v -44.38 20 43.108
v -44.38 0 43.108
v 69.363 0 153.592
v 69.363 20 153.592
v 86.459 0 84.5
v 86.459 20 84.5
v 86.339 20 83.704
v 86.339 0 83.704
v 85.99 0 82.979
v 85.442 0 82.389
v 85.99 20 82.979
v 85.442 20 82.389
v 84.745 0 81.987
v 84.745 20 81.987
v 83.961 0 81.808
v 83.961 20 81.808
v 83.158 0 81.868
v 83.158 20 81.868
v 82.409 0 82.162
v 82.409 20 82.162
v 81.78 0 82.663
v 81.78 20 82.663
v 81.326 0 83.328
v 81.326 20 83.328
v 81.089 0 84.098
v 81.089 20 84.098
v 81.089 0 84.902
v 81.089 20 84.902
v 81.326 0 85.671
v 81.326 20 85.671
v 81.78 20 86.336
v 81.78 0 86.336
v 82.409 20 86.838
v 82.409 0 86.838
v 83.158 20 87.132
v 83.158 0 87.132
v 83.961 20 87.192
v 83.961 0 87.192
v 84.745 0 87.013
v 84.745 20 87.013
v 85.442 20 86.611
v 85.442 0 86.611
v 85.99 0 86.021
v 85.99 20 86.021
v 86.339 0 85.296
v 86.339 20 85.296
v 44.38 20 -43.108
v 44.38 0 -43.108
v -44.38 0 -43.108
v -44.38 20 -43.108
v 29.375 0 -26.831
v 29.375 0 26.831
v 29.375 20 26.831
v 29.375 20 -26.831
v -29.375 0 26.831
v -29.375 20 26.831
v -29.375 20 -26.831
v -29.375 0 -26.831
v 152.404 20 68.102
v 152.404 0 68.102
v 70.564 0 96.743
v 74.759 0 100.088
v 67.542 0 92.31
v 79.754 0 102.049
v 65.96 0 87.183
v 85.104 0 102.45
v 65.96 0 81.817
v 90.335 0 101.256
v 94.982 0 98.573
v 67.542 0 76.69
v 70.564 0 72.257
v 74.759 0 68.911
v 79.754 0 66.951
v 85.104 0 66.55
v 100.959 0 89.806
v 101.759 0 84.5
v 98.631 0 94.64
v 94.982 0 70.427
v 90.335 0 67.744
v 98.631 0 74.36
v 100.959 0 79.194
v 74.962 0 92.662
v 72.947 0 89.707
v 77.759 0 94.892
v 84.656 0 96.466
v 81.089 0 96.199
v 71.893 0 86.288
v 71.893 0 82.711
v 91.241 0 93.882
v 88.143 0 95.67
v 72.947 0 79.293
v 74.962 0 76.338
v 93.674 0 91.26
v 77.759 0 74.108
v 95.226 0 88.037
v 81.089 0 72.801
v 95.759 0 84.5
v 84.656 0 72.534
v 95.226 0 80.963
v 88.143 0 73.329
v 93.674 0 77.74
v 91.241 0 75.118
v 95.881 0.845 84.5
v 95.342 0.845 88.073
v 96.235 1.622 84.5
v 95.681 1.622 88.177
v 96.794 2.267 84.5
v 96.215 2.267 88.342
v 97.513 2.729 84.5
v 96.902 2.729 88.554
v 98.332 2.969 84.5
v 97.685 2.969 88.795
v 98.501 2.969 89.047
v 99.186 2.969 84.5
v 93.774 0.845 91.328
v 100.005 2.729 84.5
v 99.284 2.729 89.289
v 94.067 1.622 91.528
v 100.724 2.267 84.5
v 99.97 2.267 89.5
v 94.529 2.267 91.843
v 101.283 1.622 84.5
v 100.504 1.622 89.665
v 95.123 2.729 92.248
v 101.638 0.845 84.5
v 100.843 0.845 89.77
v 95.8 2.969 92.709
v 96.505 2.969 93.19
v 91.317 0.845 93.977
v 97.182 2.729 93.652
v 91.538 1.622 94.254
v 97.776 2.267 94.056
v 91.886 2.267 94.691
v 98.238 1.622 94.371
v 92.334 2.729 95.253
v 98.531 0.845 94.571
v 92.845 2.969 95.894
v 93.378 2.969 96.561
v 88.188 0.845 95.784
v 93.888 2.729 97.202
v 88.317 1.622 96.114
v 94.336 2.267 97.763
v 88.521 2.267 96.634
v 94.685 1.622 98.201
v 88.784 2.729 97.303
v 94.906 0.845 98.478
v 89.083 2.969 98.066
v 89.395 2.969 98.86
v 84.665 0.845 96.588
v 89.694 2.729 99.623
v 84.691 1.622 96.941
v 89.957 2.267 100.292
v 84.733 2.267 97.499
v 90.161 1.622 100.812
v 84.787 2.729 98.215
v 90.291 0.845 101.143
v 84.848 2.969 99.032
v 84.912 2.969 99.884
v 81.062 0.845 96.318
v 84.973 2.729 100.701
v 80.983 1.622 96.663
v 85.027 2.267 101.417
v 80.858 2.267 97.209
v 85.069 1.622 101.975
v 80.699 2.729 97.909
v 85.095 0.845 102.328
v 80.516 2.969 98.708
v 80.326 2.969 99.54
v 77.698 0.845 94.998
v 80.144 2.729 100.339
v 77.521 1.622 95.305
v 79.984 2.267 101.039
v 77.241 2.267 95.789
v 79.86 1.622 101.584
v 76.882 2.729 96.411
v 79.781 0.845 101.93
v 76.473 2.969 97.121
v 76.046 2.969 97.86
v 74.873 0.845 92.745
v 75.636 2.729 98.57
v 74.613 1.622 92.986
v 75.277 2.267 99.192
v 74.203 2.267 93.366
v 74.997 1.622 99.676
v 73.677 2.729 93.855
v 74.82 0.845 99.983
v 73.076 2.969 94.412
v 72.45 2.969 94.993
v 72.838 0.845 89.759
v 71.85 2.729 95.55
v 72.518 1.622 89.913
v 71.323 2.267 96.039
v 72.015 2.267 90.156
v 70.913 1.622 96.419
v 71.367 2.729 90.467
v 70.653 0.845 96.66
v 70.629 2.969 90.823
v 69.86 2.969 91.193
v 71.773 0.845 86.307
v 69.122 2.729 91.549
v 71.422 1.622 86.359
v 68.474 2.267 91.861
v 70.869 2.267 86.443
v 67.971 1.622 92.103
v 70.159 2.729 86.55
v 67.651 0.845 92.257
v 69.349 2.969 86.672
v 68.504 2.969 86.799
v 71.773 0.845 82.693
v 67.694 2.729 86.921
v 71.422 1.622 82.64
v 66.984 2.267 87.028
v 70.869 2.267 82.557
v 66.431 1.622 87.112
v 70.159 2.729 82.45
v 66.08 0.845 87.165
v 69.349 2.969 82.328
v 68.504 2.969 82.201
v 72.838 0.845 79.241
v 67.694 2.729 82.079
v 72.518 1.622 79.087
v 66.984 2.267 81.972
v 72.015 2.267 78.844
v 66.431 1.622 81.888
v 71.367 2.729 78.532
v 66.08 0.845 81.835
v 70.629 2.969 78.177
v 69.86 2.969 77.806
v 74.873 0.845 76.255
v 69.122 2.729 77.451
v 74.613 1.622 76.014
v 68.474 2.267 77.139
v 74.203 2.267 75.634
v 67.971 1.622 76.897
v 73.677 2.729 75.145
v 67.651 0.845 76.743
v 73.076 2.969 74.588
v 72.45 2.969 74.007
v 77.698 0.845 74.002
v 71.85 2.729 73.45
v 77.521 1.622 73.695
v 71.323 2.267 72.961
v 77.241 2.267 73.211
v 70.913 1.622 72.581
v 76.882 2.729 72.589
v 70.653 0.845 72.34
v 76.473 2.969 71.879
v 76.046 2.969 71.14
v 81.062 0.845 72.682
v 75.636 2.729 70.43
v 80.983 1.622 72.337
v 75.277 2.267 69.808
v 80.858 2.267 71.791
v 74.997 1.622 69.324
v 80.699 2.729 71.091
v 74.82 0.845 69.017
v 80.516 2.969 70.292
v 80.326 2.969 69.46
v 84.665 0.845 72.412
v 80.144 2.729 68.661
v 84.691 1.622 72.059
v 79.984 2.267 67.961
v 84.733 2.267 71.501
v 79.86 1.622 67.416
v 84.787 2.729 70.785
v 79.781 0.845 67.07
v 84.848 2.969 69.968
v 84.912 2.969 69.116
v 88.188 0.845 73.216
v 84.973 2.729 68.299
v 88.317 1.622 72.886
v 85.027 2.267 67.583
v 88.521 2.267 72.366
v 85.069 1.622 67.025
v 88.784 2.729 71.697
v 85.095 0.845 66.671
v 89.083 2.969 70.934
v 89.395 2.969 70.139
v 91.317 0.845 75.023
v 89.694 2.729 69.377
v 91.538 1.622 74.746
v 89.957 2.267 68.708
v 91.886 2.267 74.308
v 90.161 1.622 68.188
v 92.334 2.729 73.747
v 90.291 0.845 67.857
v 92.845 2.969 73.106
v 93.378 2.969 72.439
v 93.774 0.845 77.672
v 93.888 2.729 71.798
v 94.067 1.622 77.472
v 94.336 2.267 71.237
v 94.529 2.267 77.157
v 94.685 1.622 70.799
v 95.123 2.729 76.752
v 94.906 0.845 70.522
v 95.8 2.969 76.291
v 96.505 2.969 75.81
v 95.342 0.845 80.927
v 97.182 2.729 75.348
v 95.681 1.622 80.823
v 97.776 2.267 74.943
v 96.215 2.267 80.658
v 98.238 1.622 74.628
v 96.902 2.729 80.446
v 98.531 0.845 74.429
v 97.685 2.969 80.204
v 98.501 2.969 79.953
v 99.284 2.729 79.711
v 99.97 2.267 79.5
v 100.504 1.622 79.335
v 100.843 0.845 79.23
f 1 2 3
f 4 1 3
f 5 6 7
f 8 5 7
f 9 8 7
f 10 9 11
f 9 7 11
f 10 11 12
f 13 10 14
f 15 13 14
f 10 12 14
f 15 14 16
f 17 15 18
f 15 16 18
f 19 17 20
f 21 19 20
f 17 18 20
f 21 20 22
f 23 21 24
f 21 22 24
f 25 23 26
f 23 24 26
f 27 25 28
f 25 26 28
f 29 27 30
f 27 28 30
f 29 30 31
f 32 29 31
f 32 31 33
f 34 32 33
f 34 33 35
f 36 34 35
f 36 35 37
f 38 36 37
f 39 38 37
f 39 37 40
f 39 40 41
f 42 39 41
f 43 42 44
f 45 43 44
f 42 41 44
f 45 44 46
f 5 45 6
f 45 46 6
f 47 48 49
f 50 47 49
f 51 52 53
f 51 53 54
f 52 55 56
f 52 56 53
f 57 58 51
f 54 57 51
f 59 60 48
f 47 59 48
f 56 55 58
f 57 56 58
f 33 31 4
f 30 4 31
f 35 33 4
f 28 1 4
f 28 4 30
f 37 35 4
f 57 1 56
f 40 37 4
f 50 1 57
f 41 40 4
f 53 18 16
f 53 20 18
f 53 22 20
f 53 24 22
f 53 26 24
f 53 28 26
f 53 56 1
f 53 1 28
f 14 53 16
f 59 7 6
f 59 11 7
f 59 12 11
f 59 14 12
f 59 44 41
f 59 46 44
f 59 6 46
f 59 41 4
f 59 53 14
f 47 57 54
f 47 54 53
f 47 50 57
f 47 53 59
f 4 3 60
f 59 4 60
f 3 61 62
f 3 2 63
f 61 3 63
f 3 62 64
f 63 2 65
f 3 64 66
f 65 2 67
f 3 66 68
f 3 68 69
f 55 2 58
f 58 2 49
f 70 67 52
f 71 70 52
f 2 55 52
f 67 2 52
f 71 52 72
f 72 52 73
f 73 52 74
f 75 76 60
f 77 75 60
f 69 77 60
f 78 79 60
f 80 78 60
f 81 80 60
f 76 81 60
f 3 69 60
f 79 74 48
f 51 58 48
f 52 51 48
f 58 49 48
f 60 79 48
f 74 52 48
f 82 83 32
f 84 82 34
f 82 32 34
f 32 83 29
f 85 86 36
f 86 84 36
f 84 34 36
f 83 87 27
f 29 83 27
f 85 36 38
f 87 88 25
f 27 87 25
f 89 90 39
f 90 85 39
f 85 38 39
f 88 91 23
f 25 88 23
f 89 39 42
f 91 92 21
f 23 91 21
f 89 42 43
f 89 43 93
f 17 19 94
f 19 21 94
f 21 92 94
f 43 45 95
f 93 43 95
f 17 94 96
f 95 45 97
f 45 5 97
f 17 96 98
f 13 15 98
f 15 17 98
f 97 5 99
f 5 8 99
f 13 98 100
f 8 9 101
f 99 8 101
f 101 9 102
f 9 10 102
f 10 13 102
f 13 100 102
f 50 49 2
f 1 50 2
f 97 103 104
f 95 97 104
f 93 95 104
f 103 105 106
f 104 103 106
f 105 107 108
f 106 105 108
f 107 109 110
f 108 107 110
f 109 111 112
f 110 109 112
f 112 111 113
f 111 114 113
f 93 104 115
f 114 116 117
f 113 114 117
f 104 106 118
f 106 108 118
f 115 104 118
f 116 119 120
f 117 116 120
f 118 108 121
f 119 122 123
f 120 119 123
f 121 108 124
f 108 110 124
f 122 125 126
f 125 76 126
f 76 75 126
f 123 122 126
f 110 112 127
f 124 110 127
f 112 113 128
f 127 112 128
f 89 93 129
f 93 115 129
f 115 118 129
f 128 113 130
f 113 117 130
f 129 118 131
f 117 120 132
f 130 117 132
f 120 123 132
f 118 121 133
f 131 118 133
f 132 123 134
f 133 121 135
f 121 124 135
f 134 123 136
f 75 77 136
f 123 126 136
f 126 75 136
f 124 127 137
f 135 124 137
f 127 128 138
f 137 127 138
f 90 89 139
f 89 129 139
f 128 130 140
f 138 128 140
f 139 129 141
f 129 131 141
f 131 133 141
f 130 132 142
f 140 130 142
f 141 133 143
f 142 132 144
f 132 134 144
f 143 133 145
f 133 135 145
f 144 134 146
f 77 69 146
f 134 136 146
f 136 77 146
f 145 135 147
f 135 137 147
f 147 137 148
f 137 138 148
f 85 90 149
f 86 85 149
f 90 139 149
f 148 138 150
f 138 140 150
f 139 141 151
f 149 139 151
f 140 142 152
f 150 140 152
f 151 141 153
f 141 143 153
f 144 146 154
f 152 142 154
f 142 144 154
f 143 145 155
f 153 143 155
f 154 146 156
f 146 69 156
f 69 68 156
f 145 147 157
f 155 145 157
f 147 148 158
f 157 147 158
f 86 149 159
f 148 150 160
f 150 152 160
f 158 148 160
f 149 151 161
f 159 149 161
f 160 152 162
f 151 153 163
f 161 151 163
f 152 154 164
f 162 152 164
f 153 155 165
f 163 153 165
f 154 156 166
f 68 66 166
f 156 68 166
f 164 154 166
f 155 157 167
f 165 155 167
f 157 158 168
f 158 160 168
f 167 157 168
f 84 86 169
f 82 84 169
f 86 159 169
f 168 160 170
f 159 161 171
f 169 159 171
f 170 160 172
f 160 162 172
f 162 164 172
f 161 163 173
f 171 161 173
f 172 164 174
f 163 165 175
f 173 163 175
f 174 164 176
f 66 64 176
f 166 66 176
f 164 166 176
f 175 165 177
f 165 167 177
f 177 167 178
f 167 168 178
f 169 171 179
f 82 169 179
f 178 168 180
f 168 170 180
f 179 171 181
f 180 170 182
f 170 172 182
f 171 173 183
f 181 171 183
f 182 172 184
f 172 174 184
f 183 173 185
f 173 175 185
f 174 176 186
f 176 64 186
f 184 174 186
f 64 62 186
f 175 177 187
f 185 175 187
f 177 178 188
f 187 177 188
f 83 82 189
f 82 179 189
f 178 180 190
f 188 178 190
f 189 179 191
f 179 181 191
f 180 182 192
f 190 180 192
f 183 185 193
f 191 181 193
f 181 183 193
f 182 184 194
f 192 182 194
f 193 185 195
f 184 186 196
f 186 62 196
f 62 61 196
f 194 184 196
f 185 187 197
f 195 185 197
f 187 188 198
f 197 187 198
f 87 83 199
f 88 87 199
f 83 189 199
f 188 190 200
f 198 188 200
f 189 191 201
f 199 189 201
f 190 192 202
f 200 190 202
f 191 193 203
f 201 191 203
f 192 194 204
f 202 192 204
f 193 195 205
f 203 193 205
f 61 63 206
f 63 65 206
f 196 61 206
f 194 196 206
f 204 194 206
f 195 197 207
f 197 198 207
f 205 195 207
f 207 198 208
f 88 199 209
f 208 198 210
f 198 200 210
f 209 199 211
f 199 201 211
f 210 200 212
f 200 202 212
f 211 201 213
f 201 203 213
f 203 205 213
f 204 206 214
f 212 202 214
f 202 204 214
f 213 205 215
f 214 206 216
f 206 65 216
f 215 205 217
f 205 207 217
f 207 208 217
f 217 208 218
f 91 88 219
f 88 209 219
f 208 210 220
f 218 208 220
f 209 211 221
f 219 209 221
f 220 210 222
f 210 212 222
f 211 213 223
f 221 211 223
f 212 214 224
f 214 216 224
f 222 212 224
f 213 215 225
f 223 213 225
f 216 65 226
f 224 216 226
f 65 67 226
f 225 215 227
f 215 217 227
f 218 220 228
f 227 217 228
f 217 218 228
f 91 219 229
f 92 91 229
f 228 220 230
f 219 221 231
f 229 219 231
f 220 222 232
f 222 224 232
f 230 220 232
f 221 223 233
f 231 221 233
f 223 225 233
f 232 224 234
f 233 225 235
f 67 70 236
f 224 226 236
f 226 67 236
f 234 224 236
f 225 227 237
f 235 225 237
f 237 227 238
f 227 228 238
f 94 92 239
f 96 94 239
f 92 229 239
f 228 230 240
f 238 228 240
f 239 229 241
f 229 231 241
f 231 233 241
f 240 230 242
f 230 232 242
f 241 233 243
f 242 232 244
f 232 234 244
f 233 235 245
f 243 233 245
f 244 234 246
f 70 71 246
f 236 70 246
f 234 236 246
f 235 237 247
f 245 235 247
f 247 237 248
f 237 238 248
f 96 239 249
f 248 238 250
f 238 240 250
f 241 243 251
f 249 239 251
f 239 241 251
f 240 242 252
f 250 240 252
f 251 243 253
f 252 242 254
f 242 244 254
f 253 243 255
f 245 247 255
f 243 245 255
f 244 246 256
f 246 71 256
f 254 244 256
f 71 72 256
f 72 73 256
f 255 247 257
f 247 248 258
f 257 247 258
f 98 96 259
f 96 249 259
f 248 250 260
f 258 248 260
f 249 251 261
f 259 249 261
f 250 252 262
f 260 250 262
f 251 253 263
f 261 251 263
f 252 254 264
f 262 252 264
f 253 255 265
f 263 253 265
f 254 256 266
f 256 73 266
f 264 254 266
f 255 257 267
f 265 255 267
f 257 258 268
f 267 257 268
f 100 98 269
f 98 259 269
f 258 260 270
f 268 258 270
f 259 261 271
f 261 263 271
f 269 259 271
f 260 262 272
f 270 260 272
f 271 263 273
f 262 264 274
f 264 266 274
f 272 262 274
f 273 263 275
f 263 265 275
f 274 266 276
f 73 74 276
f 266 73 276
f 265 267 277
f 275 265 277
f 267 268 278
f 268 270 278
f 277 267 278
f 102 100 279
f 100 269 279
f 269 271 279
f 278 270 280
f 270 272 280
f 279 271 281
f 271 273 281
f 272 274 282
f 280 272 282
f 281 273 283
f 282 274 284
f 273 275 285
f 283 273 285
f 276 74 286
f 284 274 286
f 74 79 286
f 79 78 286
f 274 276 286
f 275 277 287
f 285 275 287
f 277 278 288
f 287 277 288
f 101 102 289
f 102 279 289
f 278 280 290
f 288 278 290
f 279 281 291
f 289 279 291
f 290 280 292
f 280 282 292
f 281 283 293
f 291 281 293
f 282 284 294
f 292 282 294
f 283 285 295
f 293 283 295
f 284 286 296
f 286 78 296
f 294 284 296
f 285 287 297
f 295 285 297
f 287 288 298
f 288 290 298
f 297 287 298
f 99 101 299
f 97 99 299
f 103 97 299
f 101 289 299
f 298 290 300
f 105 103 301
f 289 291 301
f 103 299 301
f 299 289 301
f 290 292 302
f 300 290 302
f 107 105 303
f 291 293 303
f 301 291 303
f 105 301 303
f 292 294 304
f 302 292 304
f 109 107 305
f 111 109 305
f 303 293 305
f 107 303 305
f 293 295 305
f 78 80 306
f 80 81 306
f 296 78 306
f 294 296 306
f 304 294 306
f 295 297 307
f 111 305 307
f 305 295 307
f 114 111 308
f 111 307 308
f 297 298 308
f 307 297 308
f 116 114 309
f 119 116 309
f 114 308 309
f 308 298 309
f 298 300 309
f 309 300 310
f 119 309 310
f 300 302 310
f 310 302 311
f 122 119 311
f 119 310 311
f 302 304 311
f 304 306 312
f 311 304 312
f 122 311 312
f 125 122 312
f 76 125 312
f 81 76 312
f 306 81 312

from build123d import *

# Parameters (mm, degrees)
SKETCH1_W           = 58.749440694
SKETCH1_H           = 53.662909032
BOSS_EXTRUDE1_DEPTH = 20
SKETCH2_R           = 2.7
CUT_EXTRUDE1_DEPTH  = 20
SKETCH4_R           = 3


with BuildPart() as part:
    # Sketch1 → Boss-Extrude1 (new body)
    with BuildSketch(Plane(origin=(0, 0, 0), x_dir=(1, 0, 0), z_dir=(0, 1, 0))):
        Polygon((69.363086635, -153.592317311), (152.403813045, -68.102011951), (44.37998875, 43.108355834), (-44.37998875, 43.108355834), (-44.37998875, -43.108355834), align=None)
        Rectangle(SKETCH1_W, SKETCH1_H, mode=Mode.SUBTRACT)
    extrude(amount=BOSS_EXTRUDE1_DEPTH)

    # Sketch2 → Cut-Extrude1 (cut)
    with BuildSketch(Plane(origin=(0, 20, 0), x_dir=(1, 0, 0), z_dir=(0, 1, 0))):
        with Locations((83.759038646, -84.499957196)):
            Circle(SKETCH2_R)
    extrude(amount=-CUT_EXTRUDE1_DEPTH, mode=Mode.SUBTRACT)

    # Cut-Sweep1: sweep along a path in Sketch3
    with BuildLine(Plane.XZ) as cut_sweep1_path:
        CenterArc((83.759038646, 84.499957196), 15, 0, 360)
    # Sketch4 → Cut-Sweep1 (sweep, cut)
    with BuildSketch(Plane(origin=(0, 0, 0), x_dir=(0.703986253, 0, 0.710213599), z_dir=(-0.710213599, 0, 0.703986253))):
        with Locations((103.97823045, 0)):
            Circle(SKETCH4_R)
    sweep(path=cut_sweep1_path.line, mode=Mode.SUBTRACT)


solid = part.part
